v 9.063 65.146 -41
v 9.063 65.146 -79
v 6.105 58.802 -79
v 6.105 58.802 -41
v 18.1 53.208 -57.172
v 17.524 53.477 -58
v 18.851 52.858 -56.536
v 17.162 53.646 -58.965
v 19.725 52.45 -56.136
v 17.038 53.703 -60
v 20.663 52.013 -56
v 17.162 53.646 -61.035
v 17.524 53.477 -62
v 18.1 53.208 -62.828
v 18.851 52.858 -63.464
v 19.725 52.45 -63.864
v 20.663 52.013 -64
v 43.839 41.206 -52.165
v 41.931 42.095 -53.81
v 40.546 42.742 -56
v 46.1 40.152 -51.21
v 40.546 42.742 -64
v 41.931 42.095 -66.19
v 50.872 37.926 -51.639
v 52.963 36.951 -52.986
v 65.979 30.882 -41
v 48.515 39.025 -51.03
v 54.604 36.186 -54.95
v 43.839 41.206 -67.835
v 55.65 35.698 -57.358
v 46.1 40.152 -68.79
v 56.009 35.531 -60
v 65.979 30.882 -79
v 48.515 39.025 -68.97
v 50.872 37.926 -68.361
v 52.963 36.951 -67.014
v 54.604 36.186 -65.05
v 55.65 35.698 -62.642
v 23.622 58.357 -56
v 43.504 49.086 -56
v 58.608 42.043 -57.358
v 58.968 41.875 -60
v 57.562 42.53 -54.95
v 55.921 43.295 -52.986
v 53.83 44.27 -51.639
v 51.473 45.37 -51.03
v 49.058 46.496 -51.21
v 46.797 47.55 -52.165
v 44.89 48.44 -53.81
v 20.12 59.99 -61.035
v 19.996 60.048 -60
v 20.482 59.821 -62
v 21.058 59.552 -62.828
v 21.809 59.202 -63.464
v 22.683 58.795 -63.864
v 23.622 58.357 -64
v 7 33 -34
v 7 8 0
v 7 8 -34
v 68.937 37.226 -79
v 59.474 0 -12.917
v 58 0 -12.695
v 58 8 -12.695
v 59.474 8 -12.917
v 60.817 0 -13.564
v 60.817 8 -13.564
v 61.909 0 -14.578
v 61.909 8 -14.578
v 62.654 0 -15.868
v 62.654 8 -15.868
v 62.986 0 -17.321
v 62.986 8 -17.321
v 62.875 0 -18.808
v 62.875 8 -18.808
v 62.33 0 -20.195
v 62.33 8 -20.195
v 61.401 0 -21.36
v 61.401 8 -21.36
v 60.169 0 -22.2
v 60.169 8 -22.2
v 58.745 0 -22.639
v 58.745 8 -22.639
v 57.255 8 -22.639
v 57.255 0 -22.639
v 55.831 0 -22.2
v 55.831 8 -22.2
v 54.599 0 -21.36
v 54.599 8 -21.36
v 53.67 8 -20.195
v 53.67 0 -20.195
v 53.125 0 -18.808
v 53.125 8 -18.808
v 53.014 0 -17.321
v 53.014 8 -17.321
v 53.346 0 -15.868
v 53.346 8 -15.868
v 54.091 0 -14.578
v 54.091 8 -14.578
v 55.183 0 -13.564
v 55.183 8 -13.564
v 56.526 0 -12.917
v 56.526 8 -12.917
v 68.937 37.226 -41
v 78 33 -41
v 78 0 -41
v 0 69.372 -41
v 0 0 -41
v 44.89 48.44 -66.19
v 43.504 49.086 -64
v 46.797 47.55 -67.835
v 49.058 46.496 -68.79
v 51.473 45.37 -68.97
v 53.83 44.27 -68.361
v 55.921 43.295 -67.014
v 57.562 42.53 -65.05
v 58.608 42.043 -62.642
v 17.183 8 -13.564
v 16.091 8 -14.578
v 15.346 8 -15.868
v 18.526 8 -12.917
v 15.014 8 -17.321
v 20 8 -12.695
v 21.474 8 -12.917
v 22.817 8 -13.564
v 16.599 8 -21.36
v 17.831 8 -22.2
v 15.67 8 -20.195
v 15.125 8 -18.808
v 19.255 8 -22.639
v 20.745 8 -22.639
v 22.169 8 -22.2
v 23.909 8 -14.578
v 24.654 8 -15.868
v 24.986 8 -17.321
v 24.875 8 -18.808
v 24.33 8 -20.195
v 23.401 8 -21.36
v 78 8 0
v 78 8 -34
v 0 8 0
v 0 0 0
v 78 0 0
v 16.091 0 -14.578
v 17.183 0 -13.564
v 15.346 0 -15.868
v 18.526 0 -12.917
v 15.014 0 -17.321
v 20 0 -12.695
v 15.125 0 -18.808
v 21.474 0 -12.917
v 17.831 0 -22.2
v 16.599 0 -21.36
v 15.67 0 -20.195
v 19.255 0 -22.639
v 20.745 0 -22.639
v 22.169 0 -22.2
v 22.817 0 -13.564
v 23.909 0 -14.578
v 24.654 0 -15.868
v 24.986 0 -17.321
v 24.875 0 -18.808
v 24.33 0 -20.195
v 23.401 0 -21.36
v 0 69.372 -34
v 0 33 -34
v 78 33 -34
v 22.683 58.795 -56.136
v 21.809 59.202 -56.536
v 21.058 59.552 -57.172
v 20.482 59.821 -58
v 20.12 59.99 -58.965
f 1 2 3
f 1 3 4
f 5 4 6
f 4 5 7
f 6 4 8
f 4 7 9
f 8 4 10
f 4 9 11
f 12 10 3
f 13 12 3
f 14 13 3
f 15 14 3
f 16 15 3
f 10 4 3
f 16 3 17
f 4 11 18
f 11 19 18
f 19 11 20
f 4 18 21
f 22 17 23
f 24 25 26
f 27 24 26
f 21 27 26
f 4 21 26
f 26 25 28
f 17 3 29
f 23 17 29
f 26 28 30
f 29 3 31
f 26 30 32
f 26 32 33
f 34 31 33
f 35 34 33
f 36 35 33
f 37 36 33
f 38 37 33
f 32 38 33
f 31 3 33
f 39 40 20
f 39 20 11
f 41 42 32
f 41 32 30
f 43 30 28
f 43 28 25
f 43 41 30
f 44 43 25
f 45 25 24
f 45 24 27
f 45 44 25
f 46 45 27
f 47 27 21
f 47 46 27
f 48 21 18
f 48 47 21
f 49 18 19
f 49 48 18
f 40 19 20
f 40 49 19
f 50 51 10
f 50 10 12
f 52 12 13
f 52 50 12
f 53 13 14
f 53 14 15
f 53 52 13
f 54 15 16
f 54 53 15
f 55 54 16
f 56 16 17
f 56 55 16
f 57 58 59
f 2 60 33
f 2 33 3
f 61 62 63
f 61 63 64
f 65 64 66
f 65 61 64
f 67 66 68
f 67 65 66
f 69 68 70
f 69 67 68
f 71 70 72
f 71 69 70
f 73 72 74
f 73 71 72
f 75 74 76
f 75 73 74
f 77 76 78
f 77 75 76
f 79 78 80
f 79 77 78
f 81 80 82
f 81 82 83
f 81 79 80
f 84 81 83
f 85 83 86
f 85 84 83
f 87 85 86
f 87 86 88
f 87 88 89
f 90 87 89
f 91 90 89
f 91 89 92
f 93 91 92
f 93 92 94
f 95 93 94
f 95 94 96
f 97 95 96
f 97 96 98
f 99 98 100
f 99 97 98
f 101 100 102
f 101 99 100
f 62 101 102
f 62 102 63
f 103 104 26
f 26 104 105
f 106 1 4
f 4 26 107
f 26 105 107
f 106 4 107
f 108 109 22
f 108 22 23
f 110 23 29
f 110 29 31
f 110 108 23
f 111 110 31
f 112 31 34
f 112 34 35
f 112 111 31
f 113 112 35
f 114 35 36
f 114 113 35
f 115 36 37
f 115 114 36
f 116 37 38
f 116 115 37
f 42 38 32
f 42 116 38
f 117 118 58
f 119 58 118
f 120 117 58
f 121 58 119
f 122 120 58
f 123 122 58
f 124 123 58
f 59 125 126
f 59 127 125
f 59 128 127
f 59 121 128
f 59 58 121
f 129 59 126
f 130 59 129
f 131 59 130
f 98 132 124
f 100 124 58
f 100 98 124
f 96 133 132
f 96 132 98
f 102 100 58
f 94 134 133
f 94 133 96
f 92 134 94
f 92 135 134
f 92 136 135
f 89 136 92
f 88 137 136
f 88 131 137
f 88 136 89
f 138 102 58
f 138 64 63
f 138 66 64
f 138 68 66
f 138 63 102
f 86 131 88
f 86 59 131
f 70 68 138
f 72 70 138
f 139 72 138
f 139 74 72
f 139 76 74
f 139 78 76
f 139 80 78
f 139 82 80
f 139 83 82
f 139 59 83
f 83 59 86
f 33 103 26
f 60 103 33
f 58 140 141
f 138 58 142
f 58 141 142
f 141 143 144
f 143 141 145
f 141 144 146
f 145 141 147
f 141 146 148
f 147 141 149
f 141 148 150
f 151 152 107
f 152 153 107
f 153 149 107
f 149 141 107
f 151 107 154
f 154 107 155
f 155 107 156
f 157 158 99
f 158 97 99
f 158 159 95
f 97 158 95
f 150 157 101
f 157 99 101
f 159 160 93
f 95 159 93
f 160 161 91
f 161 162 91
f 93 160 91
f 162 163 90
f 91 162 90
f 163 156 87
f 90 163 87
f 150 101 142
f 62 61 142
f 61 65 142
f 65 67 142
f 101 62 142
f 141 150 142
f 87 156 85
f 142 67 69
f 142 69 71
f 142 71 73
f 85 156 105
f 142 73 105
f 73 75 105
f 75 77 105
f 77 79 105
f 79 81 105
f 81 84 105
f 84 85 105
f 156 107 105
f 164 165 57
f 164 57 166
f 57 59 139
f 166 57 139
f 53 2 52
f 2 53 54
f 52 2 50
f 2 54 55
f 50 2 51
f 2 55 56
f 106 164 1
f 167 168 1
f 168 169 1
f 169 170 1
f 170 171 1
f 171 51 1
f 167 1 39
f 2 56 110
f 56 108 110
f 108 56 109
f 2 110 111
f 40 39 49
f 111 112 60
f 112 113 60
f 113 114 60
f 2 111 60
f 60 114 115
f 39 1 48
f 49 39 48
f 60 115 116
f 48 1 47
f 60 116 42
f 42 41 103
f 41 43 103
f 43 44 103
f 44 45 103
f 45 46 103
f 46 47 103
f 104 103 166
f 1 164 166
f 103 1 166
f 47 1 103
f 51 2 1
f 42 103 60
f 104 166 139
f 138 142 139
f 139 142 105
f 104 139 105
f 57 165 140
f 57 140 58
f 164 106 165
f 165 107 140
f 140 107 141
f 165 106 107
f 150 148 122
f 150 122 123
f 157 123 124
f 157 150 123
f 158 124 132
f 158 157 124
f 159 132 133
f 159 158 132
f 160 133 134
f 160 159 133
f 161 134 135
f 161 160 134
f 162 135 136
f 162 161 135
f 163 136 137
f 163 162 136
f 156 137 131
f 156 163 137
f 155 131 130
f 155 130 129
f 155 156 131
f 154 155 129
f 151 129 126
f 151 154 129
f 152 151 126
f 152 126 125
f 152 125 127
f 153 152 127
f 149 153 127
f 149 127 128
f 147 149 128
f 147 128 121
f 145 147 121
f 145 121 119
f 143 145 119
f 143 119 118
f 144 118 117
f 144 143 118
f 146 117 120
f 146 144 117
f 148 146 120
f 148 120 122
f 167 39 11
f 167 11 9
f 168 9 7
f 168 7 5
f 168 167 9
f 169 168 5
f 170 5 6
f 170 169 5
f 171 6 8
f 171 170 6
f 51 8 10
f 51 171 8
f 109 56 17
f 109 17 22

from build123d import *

# Parameters (mm, degrees)
SKETCH1_W           = 71
SKETCH1_H           = 34
SKETCH1_R           = 5
BOSS_EXTRUDE1_DEPTH = 8
SKETCH1_3_W         = 7
SKETCH1_3_H         = 34
BOSS_EXTRUDE2_DEPTH = 33
BOSS_EXTRUDE3_DEPTH = 80
CUT_EXTRUDE1_DEPTH  = 80
BOSS_EXTRUDE4_DEPTH = 7
CHAMFER1_SIZE2      = 34
CHAMFER1_SIZE       = 25


with BuildPart() as part:
    # Sketch1 → Boss-Extrude1 (new body)
    with BuildSketch(Plane(origin=(0, 0, 0), x_dir=(1, 0, 0), z_dir=(0, 1, 0))):
        with Locations((42.5, 17)):
            Rectangle(SKETCH1_W, SKETCH1_H)
        with Locations(Location((20, 17.695066584, 0), (0, 0, 270))):
            Circle(SKETCH1_R, mode=Mode.SUBTRACT)
        with Locations(Location((58, 17.695066584, 0), (0, 0, 270))):
            Circle(SKETCH1_R, mode=Mode.SUBTRACT)
    extrude(amount=BOSS_EXTRUDE1_DEPTH)

    # Sketch1<3> → Boss-Extrude2 (add)
    with BuildSketch(Plane(origin=(0, 0, 0), x_dir=(1, 0, 0), z_dir=(0, 1, 0))):
        with Locations((3.5, 17)):
            Rectangle(SKETCH1_3_W, SKETCH1_3_H)
    extrude(amount=BOSS_EXTRUDE2_DEPTH)

    # Sketch1<4> → Boss-Extrude3 (add)
    with BuildSketch(Plane(origin=(0, 0, 0), x_dir=(1, 0, 0), z_dir=(0, 1, 0))):
        Polygon((0, 41), (0, 34), (7, 34), (78, 34), (78, 41), align=None)
    extrude(amount=BOSS_EXTRUDE3_DEPTH)

    # Sketch2 → Cut-Extrude1 (cut)
    with BuildSketch(Plane.XY.offset(-34)):
        Polygon((0, 69.371997336), (78, 33), (78, 80), (0, 80), align=None)
    extrude(amount=-CUT_EXTRUDE1_DEPTH, mode=Mode.SUBTRACT)

    # Sketch3 → Boss-Extrude4 (add)
    with BuildSketch(Plane(origin=(26.571016534, 56.981728841, 0), x_dir=(0.9063077870366528, -0.42261826174069356, 0), z_dir=(0.42261826174069356, 0.9063077870366528, 0))):
        with BuildLine():
            Line((-19.317872928, 79), (-19.317872928, 60))
            Line((-19.317872928, 60), (-7.254395249, 60))
            ThreePointArc((-7.254395249, 60), (-6.082822373, 62.828427125), (-3.254395249, 64))
            Line((-3.254395249, 64), (18.683347003, 64))
            ThreePointArc((18.683347003, 64), (28.799829698, 68.762428879), (35.745604751, 60))
            Line((35.745604751, 60), (46.745604751, 60))
            Line((46.745604751, 60), (46.745604751, 79))
            Line((46.745604751, 79), (-19.317872928, 79))
        make_face()
        with BuildLine():
            Line((-19.317872928, 60), (-19.317872928, 41))
            Line((-19.317872928, 41), (46.745604751, 41))
            Line((46.745604751, 41), (46.745604751, 60))
            Line((46.745604751, 60), (35.745604751, 60))
            ThreePointArc((35.745604751, 60), (28.799829698, 51.237571121), (18.683347003, 56))
            Line((18.683347003, 56), (-3.254395249, 56))
            ThreePointArc((-3.254395249, 56), (-6.082822373, 57.171572875), (-7.254395249, 60))
            Line((-7.254395249, 60), (-19.317872928, 60))
        make_face()
    extrude(amount=-BOSS_EXTRUDE4_DEPTH)

    # Chamfer1
    chamfer1_edges = [part.edges().sort_by_distance(p)[0] for p in [
        (3.5, 33, 0),
    ]]
    chamfer1_side = [part.faces().sort_by_distance(p)[0] for p in [
        (3.5, 32.5, 0),
    ]]
    chamfer(chamfer1_edges, length=CHAMFER1_SIZE - 0.0001, length2=CHAMFER1_SIZE2 - 0.0001, reference=chamfer1_side[0])  # a hair under: the kernel refuses the full size


solid = part.part
